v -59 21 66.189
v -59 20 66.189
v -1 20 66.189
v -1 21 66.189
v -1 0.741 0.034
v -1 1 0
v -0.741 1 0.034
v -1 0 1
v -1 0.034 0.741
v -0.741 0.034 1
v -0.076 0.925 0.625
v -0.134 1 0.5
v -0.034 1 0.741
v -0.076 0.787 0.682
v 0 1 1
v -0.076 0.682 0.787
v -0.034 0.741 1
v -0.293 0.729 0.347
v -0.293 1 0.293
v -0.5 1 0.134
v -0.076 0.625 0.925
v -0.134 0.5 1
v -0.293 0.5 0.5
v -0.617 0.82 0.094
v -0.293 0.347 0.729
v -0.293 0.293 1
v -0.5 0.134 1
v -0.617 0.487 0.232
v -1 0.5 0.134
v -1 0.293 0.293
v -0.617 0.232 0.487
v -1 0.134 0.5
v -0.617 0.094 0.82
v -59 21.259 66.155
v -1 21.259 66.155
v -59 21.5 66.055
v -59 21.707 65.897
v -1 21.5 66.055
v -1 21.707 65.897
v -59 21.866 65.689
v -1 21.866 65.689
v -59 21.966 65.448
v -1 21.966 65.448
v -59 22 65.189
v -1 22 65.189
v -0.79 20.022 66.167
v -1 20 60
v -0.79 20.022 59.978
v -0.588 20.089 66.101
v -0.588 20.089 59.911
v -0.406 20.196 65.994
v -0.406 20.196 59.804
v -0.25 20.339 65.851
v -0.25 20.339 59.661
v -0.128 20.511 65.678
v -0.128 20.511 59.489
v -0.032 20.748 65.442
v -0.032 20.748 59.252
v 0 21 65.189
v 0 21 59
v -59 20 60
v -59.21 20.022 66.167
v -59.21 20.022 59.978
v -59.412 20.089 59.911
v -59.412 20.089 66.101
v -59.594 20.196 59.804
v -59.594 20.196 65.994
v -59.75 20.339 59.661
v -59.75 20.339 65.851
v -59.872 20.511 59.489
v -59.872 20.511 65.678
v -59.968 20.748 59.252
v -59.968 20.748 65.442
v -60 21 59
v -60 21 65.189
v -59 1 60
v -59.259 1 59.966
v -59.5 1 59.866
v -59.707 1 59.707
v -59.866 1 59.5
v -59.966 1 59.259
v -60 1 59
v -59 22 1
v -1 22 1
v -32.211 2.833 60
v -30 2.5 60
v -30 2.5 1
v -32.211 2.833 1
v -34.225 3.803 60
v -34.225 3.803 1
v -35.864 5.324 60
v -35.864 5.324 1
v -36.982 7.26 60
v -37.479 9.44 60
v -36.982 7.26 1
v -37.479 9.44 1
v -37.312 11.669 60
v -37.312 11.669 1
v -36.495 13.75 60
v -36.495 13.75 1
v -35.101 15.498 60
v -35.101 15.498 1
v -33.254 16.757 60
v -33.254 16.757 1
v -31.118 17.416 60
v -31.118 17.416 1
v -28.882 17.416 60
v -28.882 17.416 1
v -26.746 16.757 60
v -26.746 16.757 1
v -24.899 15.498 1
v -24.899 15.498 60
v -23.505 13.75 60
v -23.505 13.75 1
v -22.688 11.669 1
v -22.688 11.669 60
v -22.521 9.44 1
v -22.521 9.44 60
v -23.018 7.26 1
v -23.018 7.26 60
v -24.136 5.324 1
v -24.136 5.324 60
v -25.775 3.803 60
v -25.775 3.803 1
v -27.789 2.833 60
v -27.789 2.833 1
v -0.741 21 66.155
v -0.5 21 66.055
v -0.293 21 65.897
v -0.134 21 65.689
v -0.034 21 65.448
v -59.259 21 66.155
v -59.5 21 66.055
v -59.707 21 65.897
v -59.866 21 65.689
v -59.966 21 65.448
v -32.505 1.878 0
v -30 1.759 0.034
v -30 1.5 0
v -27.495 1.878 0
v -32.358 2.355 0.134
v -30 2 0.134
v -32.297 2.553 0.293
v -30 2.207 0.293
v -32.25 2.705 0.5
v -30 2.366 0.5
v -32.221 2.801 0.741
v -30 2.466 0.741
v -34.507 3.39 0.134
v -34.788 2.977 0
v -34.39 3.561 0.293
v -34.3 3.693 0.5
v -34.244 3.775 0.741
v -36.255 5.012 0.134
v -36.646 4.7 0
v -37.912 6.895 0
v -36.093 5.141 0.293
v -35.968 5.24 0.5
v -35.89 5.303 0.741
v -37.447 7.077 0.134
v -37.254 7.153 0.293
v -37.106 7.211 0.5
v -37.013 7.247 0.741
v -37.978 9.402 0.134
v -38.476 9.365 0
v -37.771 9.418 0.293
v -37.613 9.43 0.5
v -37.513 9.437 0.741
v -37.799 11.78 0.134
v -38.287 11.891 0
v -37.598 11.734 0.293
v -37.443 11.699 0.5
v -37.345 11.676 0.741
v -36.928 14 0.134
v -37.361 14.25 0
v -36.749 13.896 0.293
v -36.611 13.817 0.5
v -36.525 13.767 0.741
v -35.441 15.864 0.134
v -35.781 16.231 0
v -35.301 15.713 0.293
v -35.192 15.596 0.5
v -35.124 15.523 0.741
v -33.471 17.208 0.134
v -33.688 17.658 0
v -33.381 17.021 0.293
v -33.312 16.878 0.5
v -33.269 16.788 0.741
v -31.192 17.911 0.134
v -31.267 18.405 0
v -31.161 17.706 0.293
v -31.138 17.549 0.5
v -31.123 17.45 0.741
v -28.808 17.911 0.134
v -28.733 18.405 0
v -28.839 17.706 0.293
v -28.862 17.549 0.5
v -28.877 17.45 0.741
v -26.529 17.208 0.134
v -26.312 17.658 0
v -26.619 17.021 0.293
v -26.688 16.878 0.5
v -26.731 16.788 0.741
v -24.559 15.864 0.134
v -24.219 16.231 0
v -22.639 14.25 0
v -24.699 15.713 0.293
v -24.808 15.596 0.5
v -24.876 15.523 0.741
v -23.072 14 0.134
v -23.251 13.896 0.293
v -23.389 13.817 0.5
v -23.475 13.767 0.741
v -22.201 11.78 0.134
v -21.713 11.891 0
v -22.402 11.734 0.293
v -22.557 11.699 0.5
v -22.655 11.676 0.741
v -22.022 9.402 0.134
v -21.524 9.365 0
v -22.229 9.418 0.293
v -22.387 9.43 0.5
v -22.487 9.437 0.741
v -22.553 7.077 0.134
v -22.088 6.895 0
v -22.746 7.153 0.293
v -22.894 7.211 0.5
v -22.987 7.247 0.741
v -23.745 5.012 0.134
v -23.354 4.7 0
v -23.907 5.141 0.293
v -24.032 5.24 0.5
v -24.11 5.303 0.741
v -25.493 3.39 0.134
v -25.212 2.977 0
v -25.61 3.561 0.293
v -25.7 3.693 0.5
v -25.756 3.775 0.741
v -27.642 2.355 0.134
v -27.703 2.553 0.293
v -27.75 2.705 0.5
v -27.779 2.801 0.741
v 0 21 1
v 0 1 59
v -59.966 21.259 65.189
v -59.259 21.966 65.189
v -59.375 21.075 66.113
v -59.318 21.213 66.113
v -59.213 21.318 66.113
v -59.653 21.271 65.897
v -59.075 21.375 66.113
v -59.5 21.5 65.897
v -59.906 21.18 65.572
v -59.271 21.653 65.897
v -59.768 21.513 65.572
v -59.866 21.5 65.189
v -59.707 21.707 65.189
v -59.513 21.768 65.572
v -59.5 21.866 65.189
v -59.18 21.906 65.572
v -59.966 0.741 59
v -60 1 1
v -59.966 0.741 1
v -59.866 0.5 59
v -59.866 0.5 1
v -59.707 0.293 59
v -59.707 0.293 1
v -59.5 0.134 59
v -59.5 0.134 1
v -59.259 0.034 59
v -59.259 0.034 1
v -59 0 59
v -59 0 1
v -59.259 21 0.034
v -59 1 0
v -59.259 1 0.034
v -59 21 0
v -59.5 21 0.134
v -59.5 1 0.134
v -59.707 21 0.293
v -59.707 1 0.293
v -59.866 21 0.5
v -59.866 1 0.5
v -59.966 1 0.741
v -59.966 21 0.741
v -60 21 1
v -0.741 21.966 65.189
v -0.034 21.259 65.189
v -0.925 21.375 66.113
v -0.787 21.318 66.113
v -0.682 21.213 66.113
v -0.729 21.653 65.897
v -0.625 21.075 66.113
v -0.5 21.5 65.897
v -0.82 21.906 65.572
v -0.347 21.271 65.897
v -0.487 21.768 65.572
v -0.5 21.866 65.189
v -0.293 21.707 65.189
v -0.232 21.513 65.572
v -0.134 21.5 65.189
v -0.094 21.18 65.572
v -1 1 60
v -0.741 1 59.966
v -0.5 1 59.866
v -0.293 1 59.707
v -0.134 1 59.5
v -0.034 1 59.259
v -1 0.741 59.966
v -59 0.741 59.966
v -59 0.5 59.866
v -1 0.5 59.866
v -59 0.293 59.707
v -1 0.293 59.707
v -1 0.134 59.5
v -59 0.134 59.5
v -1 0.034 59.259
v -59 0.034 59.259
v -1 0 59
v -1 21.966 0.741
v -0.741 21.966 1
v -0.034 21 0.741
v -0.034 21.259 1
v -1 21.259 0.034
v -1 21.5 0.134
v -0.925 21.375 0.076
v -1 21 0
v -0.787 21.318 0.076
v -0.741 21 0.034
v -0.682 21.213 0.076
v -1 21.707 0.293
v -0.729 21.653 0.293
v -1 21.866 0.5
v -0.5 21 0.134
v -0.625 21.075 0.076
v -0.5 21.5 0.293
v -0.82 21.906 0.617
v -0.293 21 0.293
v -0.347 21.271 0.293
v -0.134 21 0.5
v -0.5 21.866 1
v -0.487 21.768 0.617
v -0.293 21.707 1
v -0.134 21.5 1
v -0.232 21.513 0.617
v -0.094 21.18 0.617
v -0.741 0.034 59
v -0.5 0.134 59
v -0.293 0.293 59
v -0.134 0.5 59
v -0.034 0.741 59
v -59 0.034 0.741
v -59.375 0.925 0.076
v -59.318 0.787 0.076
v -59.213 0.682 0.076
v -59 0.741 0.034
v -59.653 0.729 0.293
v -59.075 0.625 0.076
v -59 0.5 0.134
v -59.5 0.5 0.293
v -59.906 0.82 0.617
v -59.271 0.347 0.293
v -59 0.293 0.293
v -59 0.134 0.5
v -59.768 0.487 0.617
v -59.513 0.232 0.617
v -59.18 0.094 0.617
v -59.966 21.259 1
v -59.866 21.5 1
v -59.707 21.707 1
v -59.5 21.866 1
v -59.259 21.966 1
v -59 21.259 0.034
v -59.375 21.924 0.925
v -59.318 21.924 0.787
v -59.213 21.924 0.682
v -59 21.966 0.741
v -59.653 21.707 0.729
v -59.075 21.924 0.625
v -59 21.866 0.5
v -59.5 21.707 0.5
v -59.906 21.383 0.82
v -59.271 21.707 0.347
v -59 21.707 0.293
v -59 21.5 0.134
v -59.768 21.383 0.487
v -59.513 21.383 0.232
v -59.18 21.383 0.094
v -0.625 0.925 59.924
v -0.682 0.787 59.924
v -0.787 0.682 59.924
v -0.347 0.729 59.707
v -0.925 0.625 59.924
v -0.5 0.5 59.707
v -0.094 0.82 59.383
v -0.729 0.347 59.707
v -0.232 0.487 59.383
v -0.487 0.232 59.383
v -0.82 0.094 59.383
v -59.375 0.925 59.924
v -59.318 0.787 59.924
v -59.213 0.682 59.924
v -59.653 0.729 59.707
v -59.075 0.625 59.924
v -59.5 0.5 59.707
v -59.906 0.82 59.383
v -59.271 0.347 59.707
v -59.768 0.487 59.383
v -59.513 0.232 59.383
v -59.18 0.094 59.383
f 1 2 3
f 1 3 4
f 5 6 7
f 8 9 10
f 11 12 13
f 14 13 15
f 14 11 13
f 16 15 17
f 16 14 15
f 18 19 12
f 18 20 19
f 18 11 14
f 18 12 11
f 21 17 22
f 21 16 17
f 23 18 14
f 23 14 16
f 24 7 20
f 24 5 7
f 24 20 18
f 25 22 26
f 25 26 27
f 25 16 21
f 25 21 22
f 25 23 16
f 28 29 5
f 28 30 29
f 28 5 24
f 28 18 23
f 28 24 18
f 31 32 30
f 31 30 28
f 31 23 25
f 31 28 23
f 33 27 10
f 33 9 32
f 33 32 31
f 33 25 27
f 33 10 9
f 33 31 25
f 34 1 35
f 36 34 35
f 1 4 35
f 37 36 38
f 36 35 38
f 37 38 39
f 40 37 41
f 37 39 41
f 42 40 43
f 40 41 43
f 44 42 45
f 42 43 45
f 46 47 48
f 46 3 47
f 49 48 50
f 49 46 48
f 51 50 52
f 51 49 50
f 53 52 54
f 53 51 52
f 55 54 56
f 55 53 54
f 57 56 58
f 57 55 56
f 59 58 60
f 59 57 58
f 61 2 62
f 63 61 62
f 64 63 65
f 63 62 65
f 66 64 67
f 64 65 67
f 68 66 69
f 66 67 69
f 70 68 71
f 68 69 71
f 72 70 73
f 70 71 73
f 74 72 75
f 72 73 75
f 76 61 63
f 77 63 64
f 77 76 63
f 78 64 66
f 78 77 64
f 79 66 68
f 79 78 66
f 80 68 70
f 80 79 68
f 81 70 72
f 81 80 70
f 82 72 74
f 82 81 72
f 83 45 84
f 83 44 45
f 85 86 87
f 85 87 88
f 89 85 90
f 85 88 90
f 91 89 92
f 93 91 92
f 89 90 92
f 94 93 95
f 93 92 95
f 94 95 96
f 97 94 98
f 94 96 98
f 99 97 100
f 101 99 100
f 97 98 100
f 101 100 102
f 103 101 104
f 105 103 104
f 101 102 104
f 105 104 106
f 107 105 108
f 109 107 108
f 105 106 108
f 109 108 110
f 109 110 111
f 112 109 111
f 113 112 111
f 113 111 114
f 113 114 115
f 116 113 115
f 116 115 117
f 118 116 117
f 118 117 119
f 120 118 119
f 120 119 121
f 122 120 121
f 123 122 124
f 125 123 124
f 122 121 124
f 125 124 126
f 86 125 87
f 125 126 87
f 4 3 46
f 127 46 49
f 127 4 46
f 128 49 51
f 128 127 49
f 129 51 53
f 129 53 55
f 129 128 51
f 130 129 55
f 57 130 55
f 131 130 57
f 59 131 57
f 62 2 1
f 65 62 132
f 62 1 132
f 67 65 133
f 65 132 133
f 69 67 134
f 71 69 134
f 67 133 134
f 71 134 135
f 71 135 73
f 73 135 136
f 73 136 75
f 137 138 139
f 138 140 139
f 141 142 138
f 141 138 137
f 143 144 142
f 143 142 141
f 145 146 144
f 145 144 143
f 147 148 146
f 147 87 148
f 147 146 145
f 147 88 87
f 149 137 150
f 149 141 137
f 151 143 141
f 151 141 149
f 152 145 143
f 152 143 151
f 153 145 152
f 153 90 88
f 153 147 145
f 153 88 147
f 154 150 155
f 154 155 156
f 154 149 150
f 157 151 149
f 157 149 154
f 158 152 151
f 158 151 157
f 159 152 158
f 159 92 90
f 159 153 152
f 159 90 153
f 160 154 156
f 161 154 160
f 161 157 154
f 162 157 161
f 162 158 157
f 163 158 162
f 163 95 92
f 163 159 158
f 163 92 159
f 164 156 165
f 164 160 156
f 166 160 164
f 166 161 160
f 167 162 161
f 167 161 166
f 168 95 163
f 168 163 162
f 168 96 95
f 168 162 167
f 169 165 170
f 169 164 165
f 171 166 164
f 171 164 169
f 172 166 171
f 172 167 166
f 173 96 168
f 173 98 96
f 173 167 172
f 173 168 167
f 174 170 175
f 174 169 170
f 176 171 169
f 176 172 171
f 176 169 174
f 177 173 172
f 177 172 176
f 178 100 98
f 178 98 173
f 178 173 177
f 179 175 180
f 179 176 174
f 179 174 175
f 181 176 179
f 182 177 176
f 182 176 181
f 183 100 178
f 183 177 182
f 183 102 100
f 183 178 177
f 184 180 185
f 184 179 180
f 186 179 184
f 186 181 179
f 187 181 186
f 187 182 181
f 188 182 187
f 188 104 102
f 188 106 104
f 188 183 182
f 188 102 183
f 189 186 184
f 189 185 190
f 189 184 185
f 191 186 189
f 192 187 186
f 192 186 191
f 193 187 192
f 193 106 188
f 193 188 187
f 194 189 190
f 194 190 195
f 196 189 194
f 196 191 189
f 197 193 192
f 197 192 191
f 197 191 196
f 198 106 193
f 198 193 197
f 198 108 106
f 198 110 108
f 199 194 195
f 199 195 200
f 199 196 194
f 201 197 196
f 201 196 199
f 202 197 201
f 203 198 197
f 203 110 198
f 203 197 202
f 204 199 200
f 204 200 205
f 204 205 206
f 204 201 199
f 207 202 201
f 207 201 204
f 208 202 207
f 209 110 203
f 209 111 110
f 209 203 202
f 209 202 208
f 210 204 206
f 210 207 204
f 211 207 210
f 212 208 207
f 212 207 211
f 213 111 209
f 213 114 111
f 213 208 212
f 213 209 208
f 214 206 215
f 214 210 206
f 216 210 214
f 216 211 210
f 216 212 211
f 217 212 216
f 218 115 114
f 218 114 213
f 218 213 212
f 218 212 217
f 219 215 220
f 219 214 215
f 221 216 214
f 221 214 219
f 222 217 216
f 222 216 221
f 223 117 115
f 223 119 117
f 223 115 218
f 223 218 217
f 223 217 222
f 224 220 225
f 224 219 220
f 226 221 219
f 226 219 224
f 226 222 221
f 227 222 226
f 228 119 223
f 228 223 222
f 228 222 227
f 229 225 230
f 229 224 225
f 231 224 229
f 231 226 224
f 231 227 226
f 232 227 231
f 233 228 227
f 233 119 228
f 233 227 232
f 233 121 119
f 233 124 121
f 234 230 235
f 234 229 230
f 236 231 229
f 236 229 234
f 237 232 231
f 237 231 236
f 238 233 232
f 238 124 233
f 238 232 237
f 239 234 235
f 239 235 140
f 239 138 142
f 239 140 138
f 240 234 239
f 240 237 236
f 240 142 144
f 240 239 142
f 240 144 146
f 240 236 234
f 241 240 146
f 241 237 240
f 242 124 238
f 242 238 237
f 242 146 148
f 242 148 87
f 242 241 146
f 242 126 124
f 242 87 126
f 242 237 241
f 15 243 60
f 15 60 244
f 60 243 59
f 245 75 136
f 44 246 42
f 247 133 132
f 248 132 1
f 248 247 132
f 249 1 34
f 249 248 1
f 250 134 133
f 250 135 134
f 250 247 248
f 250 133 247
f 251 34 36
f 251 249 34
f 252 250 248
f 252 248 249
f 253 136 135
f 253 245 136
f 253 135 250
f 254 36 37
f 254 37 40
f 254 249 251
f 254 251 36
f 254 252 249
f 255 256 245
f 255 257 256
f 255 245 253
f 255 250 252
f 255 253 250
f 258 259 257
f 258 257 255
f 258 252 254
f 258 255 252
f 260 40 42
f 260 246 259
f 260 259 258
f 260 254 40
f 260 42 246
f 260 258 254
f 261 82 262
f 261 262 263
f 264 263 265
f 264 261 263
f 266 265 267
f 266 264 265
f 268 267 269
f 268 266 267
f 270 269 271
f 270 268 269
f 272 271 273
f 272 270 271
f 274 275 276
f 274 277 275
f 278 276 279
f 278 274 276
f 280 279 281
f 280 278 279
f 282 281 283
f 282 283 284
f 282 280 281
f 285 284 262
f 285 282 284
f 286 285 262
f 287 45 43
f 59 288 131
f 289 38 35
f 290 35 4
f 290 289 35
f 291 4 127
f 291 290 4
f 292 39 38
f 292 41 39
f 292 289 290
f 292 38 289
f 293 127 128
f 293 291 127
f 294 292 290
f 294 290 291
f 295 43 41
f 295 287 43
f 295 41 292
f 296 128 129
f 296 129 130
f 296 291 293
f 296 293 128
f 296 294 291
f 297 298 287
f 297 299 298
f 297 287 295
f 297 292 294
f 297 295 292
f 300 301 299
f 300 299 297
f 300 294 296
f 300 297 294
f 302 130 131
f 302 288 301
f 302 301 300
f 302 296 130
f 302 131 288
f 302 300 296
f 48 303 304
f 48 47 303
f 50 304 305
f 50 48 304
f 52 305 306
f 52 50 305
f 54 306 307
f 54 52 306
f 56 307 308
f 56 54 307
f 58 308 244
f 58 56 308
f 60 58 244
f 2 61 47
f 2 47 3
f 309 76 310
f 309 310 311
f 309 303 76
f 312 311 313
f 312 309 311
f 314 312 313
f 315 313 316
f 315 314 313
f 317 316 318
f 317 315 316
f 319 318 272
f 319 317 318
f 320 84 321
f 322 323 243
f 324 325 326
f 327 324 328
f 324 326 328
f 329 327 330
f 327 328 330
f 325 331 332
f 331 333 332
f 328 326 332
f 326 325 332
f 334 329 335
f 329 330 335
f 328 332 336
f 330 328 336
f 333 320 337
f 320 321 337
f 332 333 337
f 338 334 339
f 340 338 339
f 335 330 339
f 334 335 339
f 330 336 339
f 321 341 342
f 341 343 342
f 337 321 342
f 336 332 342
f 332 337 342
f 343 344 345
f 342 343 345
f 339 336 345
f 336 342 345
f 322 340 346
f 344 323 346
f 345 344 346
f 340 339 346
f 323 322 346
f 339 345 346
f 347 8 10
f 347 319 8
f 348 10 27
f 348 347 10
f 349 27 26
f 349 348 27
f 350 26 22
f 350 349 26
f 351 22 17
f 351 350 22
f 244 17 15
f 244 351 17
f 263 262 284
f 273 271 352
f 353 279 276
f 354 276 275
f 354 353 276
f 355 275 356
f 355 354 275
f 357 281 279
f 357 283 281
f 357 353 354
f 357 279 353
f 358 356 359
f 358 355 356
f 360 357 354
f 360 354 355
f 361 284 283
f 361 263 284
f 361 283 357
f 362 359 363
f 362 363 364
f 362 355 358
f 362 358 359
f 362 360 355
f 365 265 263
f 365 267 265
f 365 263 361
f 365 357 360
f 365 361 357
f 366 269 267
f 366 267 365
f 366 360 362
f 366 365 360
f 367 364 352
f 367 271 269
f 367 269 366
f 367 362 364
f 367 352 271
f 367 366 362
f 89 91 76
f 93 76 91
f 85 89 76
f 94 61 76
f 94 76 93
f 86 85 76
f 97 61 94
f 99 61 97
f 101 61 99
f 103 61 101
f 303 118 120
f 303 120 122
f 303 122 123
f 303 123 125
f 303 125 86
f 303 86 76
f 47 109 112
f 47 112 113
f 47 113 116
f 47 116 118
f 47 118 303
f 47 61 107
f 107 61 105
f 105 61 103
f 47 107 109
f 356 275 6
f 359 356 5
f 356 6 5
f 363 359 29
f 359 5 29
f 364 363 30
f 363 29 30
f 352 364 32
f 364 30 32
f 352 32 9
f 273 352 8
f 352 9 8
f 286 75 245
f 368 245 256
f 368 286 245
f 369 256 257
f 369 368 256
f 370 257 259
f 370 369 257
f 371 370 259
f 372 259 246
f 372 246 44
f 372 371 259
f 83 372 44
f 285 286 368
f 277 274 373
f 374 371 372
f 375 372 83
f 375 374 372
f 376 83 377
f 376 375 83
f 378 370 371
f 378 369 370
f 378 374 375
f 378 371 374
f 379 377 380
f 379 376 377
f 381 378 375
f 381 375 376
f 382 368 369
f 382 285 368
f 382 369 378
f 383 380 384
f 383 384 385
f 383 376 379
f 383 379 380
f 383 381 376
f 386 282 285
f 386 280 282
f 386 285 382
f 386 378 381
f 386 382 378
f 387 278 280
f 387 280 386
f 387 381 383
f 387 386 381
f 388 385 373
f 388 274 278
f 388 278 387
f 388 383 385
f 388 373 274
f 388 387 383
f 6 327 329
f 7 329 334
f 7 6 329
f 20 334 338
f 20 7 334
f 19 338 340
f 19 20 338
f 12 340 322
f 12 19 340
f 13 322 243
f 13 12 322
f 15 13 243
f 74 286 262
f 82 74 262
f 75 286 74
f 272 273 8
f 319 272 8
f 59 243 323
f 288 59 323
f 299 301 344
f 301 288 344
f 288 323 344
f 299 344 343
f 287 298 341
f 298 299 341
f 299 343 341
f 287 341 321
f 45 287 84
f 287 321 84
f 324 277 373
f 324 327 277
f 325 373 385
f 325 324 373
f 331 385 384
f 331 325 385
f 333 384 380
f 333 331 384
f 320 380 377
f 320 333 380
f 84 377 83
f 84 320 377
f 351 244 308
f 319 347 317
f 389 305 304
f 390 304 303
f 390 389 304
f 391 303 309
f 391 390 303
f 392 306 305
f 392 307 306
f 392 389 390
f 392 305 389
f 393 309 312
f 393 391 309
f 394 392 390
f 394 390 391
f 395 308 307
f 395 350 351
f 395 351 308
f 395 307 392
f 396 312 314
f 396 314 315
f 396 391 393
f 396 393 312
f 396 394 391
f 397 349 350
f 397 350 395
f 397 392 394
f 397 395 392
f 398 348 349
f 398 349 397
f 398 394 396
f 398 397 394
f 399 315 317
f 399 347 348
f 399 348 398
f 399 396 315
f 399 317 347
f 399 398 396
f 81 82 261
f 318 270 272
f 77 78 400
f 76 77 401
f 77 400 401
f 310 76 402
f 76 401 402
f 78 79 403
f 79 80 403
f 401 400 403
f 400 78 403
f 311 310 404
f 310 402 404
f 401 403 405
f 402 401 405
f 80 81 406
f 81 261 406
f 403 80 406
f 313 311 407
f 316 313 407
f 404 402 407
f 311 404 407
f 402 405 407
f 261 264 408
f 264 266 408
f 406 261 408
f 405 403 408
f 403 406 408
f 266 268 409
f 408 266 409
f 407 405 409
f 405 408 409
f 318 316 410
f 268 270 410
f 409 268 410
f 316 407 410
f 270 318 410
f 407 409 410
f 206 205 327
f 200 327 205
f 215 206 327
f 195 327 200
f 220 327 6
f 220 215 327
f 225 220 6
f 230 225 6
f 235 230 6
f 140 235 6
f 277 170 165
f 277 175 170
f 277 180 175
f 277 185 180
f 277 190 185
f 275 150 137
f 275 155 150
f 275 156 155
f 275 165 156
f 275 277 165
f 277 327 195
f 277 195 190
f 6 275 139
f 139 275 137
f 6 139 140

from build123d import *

# Parameters (mm, degrees)
F1_DEPTH = 60
F3_DEPTH = 60
F4_R     = 0.99999


# Not quite as in the source:
# - a fillet or chamfer is up to 0.001 mm smaller than in the source, because OpenCascade refuses the exact size
# - the program builds the solid bodies; features that only make, move or delete a surface that nothing else refers to are left out


with BuildPart() as f1:
    # F0 (on Top) → F1 (new body)
    with BuildSketch(Plane.XY):
        with BuildLine():
            Line((-60, 20), (-60, 10))
            Line((-60, 10), (-37.5, 10))
            ThreePointArc((-37.5, 10), (-35.3033008589, 15.3033008589), (-30, 17.5))
            Line((-30, 17.5), (-30, 20))
            Line((-30, 20), (-60, 20))
        make_face()
        with BuildLine():
            Line((-22.5, 10), (0, 10))
            Line((0, 10), (0, 20))
            Line((0, 20), (-30, 20))
            Line((-30, 20), (-30, 17.5))
            ThreePointArc((-30, 17.5), (-24.6966991411, 15.3033008589), (-22.5, 10))
        make_face()
        with BuildLine():
            Line((-30, 0), (0, 0))
            Line((0, 0), (0, 10))
            Line((0, 10), (-22.5, 10))
            ThreePointArc((-22.5, 10), (-24.6966991411, 4.6966991411), (-30, 2.5))
            Line((-30, 2.5), (-30, 0))
        make_face()
        with BuildLine():
            Line((-60, 0), (-30, 0))
            Line((-30, 0), (-30, 2.5))
            ThreePointArc((-30, 2.5), (-35.3033008589, 4.6966991411), (-37.5, 10))
            Line((-37.5, 10), (-60, 10))
            Line((-60, 10), (-60, 0))
        make_face()
    extrude(amount=F1_DEPTH)

    # F2 (on face) → F3 (join)
    with BuildSketch(Plane(origin=(-60, 0, 0), x_dir=(0, -1, 0), z_dir=(-1, 0, 0))):
        Polygon((-22, 0), (-20, 0), (-20, 60), (-20, 66.1894296401), (-22, 66.1894296401), align=None)
    extrude(amount=-F3_DEPTH)

    # F4 (radius 1 in the source; OpenCascade refuses exactly that, so slightly less here)
    f4_edges = [f1.edges().sort_by_distance(p)[0] for p in [
        (0, 22, 33.094715),
        (-60, 0, 30),
        (-60, 11, 0),
        (-60, 22, 33.094715),
        (-60, 21, 66.18943),
        (-60, 20, 63.094715),
        (-60, 10, 60),
        (-30, 22, 66.18943),
        (-30, 22, 0),
        (-30, 0, 0),
        (0, 11, 0),
        (-30, 17.5, 0),
        (0, 0, 30),
        (0, 10, 60),
        (0, 20, 63.094715),
        (0, 21, 66.18943),
        (-30, 0, 60),
    ]]
    fillet(f4_edges, radius=F4_R)


solid = f1.part
